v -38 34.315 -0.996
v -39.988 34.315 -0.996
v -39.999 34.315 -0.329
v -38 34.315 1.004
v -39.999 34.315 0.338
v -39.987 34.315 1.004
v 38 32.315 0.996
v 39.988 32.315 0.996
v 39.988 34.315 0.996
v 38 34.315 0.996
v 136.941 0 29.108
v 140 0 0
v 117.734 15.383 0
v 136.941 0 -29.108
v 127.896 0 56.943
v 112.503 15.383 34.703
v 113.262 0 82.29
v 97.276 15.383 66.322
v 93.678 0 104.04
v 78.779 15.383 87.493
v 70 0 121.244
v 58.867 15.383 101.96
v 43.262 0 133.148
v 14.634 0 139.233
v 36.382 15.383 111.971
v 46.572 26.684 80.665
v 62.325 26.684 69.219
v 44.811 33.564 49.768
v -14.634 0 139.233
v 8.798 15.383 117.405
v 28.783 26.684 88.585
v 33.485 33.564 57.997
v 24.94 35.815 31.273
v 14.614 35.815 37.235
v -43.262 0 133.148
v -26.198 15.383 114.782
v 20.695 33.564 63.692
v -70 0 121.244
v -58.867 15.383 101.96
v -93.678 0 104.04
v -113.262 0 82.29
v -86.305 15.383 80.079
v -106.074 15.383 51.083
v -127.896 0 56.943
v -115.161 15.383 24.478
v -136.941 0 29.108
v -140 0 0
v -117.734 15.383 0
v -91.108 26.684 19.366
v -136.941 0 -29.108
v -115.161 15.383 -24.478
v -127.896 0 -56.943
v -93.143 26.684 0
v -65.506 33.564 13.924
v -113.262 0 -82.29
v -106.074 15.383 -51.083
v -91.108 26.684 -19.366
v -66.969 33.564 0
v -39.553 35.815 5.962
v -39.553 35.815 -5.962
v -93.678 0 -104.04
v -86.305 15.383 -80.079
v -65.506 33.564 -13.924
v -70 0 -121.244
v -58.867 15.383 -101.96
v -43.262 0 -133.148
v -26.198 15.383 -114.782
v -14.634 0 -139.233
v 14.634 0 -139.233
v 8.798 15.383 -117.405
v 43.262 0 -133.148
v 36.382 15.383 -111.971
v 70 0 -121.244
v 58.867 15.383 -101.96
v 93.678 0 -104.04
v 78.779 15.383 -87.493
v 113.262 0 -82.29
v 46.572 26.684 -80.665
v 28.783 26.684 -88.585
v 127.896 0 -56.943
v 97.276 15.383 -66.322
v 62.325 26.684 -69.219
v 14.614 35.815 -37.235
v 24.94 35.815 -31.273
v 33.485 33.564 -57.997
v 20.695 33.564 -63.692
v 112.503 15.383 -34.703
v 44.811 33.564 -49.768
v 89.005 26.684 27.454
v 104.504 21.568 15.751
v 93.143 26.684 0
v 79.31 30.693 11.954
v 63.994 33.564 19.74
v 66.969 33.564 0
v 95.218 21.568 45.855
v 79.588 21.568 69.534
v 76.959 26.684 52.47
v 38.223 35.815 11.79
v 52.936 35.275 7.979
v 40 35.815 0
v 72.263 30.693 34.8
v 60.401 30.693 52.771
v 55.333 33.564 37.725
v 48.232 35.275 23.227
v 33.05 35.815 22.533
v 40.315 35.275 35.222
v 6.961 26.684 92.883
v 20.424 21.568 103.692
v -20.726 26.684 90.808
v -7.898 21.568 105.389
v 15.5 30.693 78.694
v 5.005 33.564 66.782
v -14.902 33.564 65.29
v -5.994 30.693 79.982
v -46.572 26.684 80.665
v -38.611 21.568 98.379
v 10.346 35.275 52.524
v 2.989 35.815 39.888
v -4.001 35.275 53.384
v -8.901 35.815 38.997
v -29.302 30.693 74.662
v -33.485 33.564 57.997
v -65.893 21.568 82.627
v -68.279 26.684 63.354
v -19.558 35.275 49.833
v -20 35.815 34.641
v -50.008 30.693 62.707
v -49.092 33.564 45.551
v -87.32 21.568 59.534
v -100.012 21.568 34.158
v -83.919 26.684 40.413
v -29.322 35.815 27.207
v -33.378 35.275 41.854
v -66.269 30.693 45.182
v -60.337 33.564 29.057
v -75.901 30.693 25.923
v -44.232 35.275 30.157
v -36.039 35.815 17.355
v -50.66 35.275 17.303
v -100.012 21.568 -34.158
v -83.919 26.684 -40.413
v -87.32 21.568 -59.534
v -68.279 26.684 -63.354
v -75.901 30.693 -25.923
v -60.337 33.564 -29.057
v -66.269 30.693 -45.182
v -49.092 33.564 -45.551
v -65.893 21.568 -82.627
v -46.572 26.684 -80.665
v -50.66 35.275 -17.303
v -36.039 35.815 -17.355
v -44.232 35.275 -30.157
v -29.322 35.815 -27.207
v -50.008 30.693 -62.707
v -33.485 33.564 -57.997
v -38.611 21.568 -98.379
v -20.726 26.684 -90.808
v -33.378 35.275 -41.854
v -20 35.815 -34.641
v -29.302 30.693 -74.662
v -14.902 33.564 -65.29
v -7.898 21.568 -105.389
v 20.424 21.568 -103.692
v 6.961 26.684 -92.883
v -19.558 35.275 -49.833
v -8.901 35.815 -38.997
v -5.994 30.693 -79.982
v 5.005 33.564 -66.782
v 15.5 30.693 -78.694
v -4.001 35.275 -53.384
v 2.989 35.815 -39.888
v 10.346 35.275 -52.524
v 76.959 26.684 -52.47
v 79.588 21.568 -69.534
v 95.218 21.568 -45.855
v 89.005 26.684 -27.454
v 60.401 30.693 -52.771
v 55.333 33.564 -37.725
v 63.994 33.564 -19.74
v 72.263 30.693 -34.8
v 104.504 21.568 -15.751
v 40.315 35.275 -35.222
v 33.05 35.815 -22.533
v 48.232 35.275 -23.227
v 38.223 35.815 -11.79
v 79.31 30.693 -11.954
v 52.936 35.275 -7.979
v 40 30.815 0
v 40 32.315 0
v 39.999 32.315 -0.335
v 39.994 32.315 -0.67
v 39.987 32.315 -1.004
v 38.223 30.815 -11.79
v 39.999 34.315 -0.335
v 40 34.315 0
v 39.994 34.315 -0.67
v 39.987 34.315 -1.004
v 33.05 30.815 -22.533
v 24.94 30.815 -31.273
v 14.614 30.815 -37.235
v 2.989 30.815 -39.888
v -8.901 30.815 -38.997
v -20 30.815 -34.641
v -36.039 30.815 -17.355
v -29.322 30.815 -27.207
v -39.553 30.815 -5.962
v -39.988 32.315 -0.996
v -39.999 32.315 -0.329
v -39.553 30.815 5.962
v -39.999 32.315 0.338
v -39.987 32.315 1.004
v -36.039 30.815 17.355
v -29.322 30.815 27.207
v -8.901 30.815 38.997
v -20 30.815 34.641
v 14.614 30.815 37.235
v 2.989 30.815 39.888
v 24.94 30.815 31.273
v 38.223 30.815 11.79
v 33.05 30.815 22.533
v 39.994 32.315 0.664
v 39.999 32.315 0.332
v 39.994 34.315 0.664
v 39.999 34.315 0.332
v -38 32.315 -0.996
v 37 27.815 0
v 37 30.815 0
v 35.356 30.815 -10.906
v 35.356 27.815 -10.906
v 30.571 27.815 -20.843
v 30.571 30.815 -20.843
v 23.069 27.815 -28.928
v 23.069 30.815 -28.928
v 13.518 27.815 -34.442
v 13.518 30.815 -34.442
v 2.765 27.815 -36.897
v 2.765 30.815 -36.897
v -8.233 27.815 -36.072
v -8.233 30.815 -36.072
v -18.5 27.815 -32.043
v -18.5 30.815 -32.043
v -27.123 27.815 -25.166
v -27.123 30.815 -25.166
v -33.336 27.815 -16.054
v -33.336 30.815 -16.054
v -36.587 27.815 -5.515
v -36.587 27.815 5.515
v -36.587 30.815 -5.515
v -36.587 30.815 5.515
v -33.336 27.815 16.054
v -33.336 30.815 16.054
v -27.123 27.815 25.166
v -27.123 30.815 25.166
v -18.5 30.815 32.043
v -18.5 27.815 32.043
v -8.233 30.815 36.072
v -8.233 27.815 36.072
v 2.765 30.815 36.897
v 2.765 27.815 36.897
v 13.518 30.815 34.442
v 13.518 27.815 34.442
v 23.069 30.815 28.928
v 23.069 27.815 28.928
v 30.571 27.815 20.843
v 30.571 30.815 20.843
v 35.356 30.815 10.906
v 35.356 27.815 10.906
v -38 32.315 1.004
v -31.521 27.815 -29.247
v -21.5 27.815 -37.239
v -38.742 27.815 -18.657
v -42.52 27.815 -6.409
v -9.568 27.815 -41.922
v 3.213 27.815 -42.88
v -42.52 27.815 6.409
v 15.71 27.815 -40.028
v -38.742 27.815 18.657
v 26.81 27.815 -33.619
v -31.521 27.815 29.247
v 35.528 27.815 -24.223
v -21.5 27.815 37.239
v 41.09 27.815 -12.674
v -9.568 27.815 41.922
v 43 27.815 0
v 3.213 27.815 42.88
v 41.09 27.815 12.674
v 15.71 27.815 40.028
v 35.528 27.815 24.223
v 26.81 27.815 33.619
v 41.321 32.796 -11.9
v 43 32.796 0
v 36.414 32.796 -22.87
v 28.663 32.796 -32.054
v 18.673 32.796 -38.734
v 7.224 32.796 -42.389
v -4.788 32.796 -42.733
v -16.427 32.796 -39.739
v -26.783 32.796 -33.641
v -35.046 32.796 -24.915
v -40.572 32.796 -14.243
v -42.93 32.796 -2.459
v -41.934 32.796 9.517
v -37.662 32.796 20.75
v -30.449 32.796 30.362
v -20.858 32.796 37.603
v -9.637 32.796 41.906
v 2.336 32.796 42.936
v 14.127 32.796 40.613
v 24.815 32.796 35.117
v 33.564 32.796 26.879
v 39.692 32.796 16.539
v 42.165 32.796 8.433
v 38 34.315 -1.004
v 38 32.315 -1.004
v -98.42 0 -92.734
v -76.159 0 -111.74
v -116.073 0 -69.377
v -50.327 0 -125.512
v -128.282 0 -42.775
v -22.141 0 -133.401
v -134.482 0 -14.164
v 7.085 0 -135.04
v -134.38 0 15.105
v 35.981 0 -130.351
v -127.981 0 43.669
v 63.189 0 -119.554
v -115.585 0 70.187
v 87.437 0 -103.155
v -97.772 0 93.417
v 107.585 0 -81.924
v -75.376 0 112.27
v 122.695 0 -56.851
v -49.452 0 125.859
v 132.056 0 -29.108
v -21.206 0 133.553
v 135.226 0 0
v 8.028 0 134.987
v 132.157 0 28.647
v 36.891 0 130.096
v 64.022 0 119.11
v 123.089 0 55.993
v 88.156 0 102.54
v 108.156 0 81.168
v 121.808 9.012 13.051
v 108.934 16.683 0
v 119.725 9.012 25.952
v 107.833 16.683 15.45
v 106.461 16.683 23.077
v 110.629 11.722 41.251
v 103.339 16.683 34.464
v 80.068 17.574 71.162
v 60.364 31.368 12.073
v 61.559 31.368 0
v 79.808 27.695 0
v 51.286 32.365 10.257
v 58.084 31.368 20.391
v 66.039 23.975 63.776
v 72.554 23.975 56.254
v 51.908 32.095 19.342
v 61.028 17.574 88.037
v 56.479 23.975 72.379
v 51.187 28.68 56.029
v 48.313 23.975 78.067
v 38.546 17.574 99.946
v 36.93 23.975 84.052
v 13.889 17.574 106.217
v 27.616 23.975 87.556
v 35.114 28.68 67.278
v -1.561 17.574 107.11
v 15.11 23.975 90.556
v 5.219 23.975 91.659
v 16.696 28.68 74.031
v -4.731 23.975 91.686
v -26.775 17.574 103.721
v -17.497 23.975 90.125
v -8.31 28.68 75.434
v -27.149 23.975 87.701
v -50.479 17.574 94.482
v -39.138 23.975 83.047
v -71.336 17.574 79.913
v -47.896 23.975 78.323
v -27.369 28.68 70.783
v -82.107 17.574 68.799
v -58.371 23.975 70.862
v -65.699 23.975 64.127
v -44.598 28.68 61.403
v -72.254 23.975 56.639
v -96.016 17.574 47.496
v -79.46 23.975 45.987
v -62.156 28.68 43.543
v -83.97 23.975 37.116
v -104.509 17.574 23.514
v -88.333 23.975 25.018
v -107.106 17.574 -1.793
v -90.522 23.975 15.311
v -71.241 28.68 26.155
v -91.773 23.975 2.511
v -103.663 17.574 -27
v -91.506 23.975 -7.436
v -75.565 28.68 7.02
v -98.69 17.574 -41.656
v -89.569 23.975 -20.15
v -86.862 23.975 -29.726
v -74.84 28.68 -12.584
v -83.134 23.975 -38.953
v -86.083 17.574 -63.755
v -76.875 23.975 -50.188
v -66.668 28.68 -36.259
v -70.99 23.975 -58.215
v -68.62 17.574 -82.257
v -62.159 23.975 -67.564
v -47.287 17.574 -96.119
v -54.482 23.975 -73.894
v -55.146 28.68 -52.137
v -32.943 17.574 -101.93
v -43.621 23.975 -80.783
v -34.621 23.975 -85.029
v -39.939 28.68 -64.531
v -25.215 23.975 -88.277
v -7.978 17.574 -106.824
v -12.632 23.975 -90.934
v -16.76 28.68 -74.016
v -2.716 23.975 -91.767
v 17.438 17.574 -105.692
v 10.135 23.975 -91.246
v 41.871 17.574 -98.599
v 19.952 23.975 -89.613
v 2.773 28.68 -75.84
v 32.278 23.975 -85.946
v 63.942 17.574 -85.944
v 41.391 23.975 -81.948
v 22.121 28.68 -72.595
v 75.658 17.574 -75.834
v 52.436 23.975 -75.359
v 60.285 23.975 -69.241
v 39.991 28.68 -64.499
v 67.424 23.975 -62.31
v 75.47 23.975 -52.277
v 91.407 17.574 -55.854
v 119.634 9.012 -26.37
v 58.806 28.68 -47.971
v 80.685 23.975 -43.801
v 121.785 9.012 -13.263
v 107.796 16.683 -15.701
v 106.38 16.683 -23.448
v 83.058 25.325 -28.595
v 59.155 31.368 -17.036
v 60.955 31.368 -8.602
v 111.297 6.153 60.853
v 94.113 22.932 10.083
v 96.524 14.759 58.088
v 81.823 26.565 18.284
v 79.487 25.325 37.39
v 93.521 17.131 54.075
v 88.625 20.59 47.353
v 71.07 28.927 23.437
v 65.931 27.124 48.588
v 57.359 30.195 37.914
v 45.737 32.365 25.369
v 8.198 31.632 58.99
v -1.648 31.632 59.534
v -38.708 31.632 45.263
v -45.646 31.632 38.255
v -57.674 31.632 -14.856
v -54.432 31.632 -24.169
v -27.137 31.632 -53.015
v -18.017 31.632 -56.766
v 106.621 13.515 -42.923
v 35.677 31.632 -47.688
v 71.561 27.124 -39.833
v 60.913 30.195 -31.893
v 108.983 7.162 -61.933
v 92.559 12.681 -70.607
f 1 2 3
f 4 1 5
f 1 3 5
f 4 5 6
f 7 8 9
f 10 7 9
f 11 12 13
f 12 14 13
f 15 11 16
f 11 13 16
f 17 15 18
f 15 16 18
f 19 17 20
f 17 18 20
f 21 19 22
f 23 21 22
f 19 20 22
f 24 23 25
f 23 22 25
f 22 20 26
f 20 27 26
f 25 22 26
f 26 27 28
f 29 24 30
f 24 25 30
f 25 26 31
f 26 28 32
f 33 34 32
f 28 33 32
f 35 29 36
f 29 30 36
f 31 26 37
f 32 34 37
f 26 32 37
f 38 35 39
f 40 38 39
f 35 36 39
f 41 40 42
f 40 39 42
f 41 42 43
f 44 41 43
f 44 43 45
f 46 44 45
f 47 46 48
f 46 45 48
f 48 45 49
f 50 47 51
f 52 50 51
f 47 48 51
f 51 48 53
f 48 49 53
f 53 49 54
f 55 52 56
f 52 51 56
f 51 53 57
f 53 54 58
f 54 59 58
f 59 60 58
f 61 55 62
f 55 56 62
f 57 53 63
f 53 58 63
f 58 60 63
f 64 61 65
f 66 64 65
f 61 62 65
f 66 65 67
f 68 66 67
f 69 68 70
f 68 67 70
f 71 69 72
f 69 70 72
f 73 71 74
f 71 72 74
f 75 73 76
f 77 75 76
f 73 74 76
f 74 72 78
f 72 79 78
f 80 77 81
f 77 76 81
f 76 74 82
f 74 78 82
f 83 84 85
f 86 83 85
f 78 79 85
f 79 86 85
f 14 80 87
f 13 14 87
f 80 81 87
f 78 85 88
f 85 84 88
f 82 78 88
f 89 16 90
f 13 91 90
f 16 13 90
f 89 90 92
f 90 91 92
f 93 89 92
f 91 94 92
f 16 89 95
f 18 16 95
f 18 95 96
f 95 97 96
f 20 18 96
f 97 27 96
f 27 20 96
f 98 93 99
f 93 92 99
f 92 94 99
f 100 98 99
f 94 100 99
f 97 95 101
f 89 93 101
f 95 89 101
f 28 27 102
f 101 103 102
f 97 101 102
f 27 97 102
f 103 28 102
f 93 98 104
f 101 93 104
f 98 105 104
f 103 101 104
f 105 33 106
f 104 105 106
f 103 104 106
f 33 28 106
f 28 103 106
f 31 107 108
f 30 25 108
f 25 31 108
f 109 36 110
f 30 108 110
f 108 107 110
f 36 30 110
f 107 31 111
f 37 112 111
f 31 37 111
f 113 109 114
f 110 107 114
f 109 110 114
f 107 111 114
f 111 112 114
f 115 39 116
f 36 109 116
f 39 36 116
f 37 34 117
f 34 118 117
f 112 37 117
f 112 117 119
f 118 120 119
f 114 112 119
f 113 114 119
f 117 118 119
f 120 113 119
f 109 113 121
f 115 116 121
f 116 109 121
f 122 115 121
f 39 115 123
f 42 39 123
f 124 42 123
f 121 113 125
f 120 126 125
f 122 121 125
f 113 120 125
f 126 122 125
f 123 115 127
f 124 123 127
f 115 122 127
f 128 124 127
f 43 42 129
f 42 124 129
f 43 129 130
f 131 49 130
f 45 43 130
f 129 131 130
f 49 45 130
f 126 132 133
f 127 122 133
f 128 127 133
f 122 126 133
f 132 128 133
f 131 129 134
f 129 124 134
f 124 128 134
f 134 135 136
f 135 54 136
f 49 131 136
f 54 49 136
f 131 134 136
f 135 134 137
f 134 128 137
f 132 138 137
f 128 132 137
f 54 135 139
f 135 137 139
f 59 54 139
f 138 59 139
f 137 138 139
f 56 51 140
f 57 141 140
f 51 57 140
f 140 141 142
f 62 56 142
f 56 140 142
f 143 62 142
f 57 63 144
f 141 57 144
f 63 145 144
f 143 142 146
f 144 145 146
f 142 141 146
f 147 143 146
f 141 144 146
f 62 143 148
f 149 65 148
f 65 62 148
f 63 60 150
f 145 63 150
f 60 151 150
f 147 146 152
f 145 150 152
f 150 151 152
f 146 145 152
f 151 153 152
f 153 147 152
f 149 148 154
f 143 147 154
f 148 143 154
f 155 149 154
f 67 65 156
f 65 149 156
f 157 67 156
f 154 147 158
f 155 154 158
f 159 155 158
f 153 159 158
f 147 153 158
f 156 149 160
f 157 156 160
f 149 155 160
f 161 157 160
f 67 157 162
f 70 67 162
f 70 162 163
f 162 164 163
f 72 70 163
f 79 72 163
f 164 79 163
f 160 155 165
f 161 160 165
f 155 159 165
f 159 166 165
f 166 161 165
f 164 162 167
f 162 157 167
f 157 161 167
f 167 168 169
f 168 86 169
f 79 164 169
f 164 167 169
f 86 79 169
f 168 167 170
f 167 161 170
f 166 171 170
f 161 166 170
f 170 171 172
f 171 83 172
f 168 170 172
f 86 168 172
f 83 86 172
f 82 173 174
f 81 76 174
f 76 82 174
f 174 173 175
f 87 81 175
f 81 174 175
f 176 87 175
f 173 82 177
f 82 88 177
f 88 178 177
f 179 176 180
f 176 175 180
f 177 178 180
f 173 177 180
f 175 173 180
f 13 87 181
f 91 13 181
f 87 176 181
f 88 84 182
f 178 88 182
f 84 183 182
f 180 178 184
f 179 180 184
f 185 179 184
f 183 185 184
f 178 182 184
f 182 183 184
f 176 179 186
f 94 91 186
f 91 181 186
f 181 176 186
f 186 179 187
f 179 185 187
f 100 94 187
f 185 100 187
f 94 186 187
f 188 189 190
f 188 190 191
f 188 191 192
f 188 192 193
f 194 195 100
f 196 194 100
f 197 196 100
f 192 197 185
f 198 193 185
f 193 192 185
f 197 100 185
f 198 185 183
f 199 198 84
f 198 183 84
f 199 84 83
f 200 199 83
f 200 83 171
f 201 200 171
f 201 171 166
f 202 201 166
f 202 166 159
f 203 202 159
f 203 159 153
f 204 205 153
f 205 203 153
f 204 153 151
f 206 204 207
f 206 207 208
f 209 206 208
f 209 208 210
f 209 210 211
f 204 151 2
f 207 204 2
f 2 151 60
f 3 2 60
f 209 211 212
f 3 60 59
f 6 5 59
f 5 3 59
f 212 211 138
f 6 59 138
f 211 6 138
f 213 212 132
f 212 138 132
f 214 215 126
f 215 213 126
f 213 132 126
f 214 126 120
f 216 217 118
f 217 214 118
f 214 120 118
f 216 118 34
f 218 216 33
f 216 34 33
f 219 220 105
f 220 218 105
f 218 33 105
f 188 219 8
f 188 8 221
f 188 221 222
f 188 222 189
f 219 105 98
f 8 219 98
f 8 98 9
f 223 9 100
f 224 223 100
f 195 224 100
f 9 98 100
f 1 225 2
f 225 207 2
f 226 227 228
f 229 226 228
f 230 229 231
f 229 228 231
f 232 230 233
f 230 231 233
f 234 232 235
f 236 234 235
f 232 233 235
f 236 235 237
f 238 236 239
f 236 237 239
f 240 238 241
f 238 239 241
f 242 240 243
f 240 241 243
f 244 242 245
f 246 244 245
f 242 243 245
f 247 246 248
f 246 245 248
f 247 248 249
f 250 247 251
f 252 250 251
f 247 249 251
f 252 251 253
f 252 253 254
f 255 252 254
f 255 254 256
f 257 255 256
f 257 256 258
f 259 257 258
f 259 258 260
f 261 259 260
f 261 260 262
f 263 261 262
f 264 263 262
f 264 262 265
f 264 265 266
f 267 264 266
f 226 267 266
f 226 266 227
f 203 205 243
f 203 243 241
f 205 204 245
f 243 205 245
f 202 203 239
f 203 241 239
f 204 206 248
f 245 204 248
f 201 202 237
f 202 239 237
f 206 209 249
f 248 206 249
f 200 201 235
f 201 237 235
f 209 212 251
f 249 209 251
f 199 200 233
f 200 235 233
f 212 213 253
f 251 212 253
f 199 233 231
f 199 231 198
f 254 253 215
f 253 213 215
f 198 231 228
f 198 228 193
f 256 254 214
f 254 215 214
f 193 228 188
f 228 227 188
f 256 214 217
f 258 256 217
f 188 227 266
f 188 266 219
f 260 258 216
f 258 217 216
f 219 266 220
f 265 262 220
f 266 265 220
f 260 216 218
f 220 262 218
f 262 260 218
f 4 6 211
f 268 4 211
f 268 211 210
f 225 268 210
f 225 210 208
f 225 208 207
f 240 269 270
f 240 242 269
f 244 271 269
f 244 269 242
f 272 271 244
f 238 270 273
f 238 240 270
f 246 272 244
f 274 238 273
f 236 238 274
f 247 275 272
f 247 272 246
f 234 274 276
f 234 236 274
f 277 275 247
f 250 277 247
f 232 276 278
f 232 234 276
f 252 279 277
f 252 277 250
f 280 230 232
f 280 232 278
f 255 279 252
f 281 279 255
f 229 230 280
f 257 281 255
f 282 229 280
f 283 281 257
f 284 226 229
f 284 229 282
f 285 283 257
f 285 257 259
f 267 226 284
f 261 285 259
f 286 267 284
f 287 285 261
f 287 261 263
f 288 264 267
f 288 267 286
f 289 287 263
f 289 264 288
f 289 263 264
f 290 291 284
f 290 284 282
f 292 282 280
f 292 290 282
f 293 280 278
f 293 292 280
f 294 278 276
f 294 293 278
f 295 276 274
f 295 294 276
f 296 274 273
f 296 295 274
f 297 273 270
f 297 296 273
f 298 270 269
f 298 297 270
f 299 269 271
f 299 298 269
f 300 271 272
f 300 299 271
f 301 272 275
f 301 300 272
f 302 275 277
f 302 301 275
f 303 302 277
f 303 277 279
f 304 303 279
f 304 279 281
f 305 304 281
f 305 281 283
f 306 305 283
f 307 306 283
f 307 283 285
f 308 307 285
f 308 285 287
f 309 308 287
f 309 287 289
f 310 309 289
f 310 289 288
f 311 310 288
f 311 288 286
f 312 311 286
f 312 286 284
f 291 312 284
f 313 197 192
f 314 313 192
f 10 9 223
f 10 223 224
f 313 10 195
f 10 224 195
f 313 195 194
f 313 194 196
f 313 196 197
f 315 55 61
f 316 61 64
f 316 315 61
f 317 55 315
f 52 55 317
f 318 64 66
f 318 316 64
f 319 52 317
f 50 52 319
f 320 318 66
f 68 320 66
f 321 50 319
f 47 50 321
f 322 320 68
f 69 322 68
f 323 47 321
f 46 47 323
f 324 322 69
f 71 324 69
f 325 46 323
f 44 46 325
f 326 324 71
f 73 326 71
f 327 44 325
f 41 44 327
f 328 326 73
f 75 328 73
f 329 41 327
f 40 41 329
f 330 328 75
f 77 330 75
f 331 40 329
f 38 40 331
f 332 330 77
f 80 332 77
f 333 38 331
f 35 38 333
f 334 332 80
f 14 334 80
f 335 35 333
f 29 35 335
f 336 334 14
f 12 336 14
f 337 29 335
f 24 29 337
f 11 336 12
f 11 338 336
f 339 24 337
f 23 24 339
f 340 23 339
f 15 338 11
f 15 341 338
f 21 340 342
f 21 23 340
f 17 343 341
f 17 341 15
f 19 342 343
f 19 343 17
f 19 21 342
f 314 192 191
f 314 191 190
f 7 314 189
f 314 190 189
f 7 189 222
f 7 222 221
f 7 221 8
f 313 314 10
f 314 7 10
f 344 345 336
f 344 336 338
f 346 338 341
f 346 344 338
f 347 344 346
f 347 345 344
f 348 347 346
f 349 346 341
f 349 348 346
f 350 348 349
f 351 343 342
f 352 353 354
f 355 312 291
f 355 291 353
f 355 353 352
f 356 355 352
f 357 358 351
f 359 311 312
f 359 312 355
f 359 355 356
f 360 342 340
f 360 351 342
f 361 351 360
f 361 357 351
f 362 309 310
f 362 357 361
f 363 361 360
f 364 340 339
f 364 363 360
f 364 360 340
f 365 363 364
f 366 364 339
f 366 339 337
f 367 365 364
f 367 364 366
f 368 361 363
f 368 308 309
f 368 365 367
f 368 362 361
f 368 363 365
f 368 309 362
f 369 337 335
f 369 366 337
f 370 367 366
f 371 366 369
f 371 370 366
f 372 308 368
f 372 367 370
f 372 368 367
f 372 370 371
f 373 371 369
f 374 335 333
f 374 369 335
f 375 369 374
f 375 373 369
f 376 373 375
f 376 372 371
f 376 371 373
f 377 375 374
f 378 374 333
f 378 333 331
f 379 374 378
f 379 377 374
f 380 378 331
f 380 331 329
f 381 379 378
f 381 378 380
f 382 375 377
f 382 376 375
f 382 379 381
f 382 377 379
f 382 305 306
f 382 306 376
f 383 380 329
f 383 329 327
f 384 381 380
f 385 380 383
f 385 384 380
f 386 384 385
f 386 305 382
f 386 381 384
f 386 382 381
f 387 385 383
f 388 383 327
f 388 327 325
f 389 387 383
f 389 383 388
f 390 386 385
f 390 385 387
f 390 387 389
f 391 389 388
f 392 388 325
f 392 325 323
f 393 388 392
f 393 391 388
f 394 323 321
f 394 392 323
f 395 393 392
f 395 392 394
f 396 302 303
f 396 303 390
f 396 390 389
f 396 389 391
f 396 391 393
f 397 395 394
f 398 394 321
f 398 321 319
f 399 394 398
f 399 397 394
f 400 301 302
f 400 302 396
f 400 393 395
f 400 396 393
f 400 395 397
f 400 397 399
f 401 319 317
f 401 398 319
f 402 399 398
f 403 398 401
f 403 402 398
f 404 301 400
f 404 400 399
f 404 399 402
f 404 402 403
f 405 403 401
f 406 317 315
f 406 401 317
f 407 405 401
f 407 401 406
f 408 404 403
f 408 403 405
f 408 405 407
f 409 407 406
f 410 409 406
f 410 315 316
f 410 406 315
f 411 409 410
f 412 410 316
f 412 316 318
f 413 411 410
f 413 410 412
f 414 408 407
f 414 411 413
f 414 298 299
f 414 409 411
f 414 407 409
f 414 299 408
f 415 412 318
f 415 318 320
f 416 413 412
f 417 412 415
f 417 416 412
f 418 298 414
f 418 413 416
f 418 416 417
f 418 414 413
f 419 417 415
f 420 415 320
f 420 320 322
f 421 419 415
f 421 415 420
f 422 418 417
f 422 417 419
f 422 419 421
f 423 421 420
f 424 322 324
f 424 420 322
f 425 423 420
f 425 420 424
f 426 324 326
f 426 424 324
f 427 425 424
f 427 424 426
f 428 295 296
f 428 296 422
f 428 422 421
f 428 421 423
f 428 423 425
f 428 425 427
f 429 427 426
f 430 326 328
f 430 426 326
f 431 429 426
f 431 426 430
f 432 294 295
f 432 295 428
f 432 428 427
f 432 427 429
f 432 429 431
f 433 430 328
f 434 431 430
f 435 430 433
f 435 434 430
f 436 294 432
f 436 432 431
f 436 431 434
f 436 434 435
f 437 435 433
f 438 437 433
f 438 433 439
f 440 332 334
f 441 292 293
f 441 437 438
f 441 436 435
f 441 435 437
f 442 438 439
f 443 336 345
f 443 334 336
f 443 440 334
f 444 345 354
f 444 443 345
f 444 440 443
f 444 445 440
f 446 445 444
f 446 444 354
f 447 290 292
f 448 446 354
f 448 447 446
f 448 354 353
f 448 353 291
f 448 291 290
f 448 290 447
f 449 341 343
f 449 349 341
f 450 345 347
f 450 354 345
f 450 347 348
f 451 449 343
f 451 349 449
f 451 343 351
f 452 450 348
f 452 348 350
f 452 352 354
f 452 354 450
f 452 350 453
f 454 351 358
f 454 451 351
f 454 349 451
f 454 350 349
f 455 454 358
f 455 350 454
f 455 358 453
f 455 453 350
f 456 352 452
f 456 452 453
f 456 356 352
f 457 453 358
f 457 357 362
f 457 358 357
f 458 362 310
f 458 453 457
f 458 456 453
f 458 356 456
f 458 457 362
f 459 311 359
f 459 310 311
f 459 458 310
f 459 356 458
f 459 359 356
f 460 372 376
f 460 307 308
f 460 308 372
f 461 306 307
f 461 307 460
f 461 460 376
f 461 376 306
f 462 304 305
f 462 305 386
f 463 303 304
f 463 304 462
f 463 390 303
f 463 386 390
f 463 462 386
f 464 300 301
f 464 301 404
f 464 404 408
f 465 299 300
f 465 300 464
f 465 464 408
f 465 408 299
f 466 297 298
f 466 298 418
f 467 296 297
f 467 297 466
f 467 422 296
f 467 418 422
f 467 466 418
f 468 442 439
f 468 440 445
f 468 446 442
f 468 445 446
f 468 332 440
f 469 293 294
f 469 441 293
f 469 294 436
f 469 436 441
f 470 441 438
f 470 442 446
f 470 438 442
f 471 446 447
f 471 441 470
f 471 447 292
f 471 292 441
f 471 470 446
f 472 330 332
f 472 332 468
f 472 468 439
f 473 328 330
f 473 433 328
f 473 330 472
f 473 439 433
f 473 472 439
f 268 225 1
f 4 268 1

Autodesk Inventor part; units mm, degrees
ref_plane "XZ Plane" through (0, 0, 0) normal (0, 1, 0) x (-1, 0, 0)
ref_plane "XY Plane" through (0, 0, 0) normal (0, 0, 1) x (1, 0, 0)
sketch "Sketch1" plane through (0, 0, 0) normal (0, 0, 1) x (1, 0, 0)
  line L0 (0, 30.8148) -> (40, 30.8148)
  line L1 (40, 30.8148) -> (40, 35.8148)
  line L2 (0, 30.8148) -> (0, 0)
  line L3 (0, 0) -> (140, 0)
  arc A0 (140, 0) -> (40, 35.8148) centre (40.5629, -120.1278) ccw
  dimension "d0" = 40
  dimension "d1" = 5
  dimension "d2" = 140
revolve "Revolution1" add sketch "Sketch1" angle 360 about axis through (0, 30.8148, 0) along (0, -1, 0)
shell "Shell1" thickness 3 removed faces 1 at (22.2847, 0, -49.1516)
sketch "Sketch2" plane through (0, 30.8148, 0) normal (0, 1, 0) x (1, 0, 0)
  circle A0 centre (0, 0) radius 37
  dimension "d5" = 74
extrude "Extrusion1" cut sketch "Sketch2" against normal through all
ref_plane "Work Plane1" through (40, 33.3148, 0) normal (1, 0, 0) x (0, 1, 0)
sketch "Sketch4" plane through (40, 33.3148, 0) normal (1, 0, 0) x (0, 1, 0)
  line L0 (1, -1.0043) -> (-1, -1.0043)
  line L1 (-1, -1.0043) -> (-1, 0.9957)
  line L2 (-1, 0.9957) -> (1, 0.9957)
  line L3 (1, 0.9957) -> (1, -1.0043)
  line L4 (-2.5, 40) -> (-2.5, -40) projected
  point P0 (-33.3148, 0)
  dimension "d8" = 2
  dimension "d9" = 2
  dimension "d10" = 1.5
extrude "Extrusion2" add sketch "Sketch4" against normal blind 2
pattern_circular "Circular Pattern1" count 2 over 360 about axis through (0, 30.8148, 0) along (0, -1, 0) of "Extrusion2"
equation "\"d9\" = d8"
properties part number "topplock"
